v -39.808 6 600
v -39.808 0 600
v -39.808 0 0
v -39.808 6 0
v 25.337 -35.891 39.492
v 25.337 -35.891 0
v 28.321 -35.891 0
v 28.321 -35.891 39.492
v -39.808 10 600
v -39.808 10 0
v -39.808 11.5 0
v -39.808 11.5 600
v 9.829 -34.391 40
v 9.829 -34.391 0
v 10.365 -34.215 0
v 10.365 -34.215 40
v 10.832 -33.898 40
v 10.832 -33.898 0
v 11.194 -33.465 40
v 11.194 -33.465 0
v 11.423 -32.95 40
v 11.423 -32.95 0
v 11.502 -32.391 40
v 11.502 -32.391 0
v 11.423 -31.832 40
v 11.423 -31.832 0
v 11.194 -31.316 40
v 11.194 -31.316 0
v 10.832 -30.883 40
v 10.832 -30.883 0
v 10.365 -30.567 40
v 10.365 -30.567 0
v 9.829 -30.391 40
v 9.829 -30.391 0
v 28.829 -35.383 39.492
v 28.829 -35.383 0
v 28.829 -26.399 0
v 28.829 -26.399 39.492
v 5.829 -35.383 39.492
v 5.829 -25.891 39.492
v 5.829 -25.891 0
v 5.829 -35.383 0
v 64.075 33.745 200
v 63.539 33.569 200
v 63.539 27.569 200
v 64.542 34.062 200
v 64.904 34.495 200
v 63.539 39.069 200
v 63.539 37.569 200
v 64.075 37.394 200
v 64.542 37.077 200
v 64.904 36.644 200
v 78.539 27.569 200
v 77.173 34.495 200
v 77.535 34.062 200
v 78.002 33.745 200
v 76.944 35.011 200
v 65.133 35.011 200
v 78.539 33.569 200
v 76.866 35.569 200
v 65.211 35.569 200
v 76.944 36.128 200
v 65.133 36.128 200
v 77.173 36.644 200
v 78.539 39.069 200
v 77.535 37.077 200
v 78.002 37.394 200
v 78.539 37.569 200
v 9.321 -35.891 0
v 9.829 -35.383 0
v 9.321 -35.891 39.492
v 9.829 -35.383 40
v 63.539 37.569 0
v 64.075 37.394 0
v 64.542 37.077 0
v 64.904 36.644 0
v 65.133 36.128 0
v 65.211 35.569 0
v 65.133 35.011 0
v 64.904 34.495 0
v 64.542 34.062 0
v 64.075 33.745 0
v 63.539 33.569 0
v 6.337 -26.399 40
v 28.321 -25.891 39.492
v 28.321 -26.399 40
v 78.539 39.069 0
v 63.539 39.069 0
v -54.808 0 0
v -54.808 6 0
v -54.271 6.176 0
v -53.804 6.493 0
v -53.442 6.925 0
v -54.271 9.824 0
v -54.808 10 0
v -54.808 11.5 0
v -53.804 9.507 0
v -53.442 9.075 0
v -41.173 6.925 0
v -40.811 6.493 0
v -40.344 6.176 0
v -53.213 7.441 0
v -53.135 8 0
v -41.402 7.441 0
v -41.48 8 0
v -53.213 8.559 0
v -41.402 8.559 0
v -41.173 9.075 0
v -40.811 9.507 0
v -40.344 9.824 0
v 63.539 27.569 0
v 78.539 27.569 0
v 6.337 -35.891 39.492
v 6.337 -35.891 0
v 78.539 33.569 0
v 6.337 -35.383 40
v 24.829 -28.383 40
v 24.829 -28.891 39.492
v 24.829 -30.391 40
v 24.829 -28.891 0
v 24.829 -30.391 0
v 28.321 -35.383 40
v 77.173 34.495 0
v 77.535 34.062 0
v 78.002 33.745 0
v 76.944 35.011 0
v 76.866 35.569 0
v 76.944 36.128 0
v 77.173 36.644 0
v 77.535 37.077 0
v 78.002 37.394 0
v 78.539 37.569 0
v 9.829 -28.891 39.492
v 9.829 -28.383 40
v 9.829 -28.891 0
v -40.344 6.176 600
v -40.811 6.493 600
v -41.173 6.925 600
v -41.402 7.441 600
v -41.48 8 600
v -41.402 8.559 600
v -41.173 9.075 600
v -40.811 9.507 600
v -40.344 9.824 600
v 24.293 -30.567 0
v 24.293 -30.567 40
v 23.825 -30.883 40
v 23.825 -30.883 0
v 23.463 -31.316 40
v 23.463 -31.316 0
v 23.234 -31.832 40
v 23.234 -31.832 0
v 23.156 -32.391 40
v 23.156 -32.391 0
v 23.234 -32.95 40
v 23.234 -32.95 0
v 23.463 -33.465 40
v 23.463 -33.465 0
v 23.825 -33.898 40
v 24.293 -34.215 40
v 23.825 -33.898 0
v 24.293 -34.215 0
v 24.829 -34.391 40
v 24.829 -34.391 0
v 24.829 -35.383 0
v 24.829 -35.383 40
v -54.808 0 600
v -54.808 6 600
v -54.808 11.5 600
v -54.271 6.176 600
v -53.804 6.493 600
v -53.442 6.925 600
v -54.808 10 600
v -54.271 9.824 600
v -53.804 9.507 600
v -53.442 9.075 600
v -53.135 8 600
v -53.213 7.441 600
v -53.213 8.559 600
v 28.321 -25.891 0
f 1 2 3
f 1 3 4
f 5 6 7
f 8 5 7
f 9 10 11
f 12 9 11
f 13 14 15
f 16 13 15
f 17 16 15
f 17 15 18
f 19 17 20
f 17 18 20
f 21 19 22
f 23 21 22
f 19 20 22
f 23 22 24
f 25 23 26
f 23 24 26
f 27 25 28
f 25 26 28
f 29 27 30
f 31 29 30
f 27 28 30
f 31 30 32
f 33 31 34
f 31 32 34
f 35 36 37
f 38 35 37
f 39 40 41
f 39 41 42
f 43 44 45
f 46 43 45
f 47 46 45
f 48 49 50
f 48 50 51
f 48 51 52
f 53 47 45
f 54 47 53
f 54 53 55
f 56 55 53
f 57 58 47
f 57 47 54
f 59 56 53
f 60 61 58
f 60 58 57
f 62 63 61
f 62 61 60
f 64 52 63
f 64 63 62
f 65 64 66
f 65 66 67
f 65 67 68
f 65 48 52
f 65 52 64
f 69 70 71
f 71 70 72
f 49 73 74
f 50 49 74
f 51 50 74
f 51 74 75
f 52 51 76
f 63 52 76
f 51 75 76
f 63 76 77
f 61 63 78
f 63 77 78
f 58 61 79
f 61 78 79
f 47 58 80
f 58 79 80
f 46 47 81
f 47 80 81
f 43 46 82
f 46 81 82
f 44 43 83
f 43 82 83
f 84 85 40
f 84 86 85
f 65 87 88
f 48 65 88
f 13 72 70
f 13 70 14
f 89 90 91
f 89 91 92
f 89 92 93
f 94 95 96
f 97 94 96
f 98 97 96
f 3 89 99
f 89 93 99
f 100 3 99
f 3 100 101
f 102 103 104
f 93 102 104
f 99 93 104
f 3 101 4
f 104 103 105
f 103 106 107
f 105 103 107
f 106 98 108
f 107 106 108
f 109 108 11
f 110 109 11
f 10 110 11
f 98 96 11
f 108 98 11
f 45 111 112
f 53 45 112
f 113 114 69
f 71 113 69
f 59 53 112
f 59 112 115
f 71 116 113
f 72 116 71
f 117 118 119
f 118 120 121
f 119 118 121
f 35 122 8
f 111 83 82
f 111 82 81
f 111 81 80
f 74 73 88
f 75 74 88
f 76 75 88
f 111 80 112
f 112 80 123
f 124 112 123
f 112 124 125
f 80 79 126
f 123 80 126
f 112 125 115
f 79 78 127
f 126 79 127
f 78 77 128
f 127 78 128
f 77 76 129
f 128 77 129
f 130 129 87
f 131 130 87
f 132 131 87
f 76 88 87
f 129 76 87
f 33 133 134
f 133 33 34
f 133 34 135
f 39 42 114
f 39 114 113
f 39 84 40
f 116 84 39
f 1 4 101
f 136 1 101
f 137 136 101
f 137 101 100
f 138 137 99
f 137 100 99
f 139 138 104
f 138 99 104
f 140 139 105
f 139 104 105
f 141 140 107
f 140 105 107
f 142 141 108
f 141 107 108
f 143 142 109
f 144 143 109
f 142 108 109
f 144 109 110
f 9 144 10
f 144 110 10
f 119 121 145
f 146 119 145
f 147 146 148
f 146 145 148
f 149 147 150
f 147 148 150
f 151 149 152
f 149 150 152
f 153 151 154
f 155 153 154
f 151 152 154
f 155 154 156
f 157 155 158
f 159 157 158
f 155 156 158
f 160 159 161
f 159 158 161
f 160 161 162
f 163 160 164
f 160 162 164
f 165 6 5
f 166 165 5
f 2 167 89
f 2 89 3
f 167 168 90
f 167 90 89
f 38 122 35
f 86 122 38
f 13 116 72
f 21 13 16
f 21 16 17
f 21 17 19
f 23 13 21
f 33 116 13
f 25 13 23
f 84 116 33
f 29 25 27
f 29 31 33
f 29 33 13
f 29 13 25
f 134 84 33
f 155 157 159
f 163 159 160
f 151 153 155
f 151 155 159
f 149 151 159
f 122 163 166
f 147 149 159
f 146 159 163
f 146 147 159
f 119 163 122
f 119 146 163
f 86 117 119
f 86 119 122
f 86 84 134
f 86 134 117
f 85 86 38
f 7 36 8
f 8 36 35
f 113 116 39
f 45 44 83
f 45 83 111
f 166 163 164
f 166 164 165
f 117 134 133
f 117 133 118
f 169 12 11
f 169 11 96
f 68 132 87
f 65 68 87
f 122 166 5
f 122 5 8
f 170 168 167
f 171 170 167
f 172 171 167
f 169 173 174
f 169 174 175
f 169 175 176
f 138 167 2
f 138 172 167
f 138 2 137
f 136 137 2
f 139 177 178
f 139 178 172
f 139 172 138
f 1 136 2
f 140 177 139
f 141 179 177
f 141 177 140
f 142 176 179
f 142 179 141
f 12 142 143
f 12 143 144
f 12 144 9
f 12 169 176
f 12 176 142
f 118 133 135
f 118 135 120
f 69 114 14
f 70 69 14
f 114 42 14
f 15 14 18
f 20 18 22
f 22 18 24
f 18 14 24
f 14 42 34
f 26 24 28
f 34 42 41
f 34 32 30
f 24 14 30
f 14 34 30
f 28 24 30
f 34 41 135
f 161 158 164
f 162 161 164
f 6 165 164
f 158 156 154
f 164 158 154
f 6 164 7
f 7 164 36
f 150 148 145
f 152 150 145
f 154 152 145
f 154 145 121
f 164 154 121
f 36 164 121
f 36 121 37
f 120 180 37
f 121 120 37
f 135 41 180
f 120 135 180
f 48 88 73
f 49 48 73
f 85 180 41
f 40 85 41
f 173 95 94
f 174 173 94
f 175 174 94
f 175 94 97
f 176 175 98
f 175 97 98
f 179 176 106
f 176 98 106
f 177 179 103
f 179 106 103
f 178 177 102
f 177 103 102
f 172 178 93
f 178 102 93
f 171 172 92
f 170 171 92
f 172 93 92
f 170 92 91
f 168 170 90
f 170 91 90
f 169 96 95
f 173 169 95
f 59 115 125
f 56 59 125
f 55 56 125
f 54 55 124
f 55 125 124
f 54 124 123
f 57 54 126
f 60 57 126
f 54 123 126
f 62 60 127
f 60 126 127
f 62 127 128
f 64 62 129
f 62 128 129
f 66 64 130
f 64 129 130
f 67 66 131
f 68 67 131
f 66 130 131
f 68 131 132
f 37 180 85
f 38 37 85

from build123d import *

# Parameters (mm, degrees)
F1_DEPTH = 600
F2_DEPTH = 200
F3_DEPTH = 40
F4_SIZE  = 0.508


with BuildPart() as f1:
    # F0 (on Top) → F1 (new body)
    with BuildSketch(Plane.XY):
        with BuildLine():
            Line((-54.807698, 6), (-54.807698, 0))
            Line((-54.807698, 0), (-39.807698, 0))
            Line((-39.807698, 0), (-39.807698, 6))
            ThreePointArc((-39.807698, 6), (-41.480499, 8), (-39.807698, 10))
            Line((-39.807698, 10), (-39.807698, 11.5))
            Line((-39.807698, 11.5), (-54.807698, 11.5))
            Line((-54.807698, 11.5), (-54.807698, 10))
            ThreePointArc((-54.807698, 10), (-53.134897, 8), (-54.807698, 6))
        make_face()
    extrude(amount=F1_DEPTH)


with BuildPart() as f2:
    # F0 (on Top) → F2 (new body)
    with BuildSketch(Plane.XY):
        with BuildLine():
            Line((63.538671, 33.569481), (63.538671, 27.569481))
            Line((63.538671, 27.569481), (78.538671, 27.569481))
            Line((78.538671, 27.569481), (78.538671, 33.569481))
            ThreePointArc((78.538671, 33.569481), (76.86587, 35.569481), (78.538671, 37.569481))
            Line((78.538671, 37.569481), (78.538671, 39.069481))
            Line((78.538671, 39.069481), (63.538671, 39.069481))
            Line((63.538671, 39.069481), (63.538671, 37.569481))
            ThreePointArc((63.538671, 37.569481), (65.211472, 35.569481), (63.538671, 33.569481))
        make_face()
    extrude(amount=F2_DEPTH)


with BuildPart() as f3:
    # F0 (on Top) → F3 (new body)
    with BuildSketch(Plane.XY):
        with BuildLine():
            Line((5.828797, -35.890774), (9.828797, -35.890774))
            Line((9.828797, -35.890774), (9.828797, -34.390774))
            ThreePointArc((9.828797, -34.390774), (11.501598, -32.390774), (9.828797, -30.390774))
            Line((9.828797, -30.390774), (9.828797, -28.890774))
            Line((9.828797, -28.890774), (24.828797, -28.890774))
            Line((24.828797, -28.890774), (24.828797, -30.390774))
            ThreePointArc((24.828797, -30.390774), (23.155996, -32.390774), (24.828797, -34.390774))
            Line((24.828797, -34.390774), (24.828797, -35.890774))
            Line((24.828797, -35.890774), (28.828797, -35.890774))
            Line((28.828797, -35.890774), (28.828797, -25.890774))
            Line((28.828797, -25.890774), (5.828797, -25.890774))
            Line((5.828797, -25.890774), (5.828797, -35.890774))
        make_face()
    extrude(amount=F3_DEPTH)

    # F4
    f4_edges = [f3.edges().sort_by_distance(p)[0] for p in [
        (17.328797, -25.890774, 40),
        (5.828797, -30.890774, 40),
        (28.828797, -30.890774, 40),
        (7.828797, -35.890774, 40),
        (26.828797, -35.890774, 40),
        (5.828797, -35.890774, 20),
        (28.828797, -35.890774, 20),
        (28.828797, -25.890774, 20),
        (17.328797, -28.890774, 40),
        (9.828797, -35.890774, 20),
        (24.828797, -35.890774, 20),
    ]]
    chamfer(f4_edges, length=F4_SIZE)


solid = Compound([f1.part, f2.part, f3.part])
